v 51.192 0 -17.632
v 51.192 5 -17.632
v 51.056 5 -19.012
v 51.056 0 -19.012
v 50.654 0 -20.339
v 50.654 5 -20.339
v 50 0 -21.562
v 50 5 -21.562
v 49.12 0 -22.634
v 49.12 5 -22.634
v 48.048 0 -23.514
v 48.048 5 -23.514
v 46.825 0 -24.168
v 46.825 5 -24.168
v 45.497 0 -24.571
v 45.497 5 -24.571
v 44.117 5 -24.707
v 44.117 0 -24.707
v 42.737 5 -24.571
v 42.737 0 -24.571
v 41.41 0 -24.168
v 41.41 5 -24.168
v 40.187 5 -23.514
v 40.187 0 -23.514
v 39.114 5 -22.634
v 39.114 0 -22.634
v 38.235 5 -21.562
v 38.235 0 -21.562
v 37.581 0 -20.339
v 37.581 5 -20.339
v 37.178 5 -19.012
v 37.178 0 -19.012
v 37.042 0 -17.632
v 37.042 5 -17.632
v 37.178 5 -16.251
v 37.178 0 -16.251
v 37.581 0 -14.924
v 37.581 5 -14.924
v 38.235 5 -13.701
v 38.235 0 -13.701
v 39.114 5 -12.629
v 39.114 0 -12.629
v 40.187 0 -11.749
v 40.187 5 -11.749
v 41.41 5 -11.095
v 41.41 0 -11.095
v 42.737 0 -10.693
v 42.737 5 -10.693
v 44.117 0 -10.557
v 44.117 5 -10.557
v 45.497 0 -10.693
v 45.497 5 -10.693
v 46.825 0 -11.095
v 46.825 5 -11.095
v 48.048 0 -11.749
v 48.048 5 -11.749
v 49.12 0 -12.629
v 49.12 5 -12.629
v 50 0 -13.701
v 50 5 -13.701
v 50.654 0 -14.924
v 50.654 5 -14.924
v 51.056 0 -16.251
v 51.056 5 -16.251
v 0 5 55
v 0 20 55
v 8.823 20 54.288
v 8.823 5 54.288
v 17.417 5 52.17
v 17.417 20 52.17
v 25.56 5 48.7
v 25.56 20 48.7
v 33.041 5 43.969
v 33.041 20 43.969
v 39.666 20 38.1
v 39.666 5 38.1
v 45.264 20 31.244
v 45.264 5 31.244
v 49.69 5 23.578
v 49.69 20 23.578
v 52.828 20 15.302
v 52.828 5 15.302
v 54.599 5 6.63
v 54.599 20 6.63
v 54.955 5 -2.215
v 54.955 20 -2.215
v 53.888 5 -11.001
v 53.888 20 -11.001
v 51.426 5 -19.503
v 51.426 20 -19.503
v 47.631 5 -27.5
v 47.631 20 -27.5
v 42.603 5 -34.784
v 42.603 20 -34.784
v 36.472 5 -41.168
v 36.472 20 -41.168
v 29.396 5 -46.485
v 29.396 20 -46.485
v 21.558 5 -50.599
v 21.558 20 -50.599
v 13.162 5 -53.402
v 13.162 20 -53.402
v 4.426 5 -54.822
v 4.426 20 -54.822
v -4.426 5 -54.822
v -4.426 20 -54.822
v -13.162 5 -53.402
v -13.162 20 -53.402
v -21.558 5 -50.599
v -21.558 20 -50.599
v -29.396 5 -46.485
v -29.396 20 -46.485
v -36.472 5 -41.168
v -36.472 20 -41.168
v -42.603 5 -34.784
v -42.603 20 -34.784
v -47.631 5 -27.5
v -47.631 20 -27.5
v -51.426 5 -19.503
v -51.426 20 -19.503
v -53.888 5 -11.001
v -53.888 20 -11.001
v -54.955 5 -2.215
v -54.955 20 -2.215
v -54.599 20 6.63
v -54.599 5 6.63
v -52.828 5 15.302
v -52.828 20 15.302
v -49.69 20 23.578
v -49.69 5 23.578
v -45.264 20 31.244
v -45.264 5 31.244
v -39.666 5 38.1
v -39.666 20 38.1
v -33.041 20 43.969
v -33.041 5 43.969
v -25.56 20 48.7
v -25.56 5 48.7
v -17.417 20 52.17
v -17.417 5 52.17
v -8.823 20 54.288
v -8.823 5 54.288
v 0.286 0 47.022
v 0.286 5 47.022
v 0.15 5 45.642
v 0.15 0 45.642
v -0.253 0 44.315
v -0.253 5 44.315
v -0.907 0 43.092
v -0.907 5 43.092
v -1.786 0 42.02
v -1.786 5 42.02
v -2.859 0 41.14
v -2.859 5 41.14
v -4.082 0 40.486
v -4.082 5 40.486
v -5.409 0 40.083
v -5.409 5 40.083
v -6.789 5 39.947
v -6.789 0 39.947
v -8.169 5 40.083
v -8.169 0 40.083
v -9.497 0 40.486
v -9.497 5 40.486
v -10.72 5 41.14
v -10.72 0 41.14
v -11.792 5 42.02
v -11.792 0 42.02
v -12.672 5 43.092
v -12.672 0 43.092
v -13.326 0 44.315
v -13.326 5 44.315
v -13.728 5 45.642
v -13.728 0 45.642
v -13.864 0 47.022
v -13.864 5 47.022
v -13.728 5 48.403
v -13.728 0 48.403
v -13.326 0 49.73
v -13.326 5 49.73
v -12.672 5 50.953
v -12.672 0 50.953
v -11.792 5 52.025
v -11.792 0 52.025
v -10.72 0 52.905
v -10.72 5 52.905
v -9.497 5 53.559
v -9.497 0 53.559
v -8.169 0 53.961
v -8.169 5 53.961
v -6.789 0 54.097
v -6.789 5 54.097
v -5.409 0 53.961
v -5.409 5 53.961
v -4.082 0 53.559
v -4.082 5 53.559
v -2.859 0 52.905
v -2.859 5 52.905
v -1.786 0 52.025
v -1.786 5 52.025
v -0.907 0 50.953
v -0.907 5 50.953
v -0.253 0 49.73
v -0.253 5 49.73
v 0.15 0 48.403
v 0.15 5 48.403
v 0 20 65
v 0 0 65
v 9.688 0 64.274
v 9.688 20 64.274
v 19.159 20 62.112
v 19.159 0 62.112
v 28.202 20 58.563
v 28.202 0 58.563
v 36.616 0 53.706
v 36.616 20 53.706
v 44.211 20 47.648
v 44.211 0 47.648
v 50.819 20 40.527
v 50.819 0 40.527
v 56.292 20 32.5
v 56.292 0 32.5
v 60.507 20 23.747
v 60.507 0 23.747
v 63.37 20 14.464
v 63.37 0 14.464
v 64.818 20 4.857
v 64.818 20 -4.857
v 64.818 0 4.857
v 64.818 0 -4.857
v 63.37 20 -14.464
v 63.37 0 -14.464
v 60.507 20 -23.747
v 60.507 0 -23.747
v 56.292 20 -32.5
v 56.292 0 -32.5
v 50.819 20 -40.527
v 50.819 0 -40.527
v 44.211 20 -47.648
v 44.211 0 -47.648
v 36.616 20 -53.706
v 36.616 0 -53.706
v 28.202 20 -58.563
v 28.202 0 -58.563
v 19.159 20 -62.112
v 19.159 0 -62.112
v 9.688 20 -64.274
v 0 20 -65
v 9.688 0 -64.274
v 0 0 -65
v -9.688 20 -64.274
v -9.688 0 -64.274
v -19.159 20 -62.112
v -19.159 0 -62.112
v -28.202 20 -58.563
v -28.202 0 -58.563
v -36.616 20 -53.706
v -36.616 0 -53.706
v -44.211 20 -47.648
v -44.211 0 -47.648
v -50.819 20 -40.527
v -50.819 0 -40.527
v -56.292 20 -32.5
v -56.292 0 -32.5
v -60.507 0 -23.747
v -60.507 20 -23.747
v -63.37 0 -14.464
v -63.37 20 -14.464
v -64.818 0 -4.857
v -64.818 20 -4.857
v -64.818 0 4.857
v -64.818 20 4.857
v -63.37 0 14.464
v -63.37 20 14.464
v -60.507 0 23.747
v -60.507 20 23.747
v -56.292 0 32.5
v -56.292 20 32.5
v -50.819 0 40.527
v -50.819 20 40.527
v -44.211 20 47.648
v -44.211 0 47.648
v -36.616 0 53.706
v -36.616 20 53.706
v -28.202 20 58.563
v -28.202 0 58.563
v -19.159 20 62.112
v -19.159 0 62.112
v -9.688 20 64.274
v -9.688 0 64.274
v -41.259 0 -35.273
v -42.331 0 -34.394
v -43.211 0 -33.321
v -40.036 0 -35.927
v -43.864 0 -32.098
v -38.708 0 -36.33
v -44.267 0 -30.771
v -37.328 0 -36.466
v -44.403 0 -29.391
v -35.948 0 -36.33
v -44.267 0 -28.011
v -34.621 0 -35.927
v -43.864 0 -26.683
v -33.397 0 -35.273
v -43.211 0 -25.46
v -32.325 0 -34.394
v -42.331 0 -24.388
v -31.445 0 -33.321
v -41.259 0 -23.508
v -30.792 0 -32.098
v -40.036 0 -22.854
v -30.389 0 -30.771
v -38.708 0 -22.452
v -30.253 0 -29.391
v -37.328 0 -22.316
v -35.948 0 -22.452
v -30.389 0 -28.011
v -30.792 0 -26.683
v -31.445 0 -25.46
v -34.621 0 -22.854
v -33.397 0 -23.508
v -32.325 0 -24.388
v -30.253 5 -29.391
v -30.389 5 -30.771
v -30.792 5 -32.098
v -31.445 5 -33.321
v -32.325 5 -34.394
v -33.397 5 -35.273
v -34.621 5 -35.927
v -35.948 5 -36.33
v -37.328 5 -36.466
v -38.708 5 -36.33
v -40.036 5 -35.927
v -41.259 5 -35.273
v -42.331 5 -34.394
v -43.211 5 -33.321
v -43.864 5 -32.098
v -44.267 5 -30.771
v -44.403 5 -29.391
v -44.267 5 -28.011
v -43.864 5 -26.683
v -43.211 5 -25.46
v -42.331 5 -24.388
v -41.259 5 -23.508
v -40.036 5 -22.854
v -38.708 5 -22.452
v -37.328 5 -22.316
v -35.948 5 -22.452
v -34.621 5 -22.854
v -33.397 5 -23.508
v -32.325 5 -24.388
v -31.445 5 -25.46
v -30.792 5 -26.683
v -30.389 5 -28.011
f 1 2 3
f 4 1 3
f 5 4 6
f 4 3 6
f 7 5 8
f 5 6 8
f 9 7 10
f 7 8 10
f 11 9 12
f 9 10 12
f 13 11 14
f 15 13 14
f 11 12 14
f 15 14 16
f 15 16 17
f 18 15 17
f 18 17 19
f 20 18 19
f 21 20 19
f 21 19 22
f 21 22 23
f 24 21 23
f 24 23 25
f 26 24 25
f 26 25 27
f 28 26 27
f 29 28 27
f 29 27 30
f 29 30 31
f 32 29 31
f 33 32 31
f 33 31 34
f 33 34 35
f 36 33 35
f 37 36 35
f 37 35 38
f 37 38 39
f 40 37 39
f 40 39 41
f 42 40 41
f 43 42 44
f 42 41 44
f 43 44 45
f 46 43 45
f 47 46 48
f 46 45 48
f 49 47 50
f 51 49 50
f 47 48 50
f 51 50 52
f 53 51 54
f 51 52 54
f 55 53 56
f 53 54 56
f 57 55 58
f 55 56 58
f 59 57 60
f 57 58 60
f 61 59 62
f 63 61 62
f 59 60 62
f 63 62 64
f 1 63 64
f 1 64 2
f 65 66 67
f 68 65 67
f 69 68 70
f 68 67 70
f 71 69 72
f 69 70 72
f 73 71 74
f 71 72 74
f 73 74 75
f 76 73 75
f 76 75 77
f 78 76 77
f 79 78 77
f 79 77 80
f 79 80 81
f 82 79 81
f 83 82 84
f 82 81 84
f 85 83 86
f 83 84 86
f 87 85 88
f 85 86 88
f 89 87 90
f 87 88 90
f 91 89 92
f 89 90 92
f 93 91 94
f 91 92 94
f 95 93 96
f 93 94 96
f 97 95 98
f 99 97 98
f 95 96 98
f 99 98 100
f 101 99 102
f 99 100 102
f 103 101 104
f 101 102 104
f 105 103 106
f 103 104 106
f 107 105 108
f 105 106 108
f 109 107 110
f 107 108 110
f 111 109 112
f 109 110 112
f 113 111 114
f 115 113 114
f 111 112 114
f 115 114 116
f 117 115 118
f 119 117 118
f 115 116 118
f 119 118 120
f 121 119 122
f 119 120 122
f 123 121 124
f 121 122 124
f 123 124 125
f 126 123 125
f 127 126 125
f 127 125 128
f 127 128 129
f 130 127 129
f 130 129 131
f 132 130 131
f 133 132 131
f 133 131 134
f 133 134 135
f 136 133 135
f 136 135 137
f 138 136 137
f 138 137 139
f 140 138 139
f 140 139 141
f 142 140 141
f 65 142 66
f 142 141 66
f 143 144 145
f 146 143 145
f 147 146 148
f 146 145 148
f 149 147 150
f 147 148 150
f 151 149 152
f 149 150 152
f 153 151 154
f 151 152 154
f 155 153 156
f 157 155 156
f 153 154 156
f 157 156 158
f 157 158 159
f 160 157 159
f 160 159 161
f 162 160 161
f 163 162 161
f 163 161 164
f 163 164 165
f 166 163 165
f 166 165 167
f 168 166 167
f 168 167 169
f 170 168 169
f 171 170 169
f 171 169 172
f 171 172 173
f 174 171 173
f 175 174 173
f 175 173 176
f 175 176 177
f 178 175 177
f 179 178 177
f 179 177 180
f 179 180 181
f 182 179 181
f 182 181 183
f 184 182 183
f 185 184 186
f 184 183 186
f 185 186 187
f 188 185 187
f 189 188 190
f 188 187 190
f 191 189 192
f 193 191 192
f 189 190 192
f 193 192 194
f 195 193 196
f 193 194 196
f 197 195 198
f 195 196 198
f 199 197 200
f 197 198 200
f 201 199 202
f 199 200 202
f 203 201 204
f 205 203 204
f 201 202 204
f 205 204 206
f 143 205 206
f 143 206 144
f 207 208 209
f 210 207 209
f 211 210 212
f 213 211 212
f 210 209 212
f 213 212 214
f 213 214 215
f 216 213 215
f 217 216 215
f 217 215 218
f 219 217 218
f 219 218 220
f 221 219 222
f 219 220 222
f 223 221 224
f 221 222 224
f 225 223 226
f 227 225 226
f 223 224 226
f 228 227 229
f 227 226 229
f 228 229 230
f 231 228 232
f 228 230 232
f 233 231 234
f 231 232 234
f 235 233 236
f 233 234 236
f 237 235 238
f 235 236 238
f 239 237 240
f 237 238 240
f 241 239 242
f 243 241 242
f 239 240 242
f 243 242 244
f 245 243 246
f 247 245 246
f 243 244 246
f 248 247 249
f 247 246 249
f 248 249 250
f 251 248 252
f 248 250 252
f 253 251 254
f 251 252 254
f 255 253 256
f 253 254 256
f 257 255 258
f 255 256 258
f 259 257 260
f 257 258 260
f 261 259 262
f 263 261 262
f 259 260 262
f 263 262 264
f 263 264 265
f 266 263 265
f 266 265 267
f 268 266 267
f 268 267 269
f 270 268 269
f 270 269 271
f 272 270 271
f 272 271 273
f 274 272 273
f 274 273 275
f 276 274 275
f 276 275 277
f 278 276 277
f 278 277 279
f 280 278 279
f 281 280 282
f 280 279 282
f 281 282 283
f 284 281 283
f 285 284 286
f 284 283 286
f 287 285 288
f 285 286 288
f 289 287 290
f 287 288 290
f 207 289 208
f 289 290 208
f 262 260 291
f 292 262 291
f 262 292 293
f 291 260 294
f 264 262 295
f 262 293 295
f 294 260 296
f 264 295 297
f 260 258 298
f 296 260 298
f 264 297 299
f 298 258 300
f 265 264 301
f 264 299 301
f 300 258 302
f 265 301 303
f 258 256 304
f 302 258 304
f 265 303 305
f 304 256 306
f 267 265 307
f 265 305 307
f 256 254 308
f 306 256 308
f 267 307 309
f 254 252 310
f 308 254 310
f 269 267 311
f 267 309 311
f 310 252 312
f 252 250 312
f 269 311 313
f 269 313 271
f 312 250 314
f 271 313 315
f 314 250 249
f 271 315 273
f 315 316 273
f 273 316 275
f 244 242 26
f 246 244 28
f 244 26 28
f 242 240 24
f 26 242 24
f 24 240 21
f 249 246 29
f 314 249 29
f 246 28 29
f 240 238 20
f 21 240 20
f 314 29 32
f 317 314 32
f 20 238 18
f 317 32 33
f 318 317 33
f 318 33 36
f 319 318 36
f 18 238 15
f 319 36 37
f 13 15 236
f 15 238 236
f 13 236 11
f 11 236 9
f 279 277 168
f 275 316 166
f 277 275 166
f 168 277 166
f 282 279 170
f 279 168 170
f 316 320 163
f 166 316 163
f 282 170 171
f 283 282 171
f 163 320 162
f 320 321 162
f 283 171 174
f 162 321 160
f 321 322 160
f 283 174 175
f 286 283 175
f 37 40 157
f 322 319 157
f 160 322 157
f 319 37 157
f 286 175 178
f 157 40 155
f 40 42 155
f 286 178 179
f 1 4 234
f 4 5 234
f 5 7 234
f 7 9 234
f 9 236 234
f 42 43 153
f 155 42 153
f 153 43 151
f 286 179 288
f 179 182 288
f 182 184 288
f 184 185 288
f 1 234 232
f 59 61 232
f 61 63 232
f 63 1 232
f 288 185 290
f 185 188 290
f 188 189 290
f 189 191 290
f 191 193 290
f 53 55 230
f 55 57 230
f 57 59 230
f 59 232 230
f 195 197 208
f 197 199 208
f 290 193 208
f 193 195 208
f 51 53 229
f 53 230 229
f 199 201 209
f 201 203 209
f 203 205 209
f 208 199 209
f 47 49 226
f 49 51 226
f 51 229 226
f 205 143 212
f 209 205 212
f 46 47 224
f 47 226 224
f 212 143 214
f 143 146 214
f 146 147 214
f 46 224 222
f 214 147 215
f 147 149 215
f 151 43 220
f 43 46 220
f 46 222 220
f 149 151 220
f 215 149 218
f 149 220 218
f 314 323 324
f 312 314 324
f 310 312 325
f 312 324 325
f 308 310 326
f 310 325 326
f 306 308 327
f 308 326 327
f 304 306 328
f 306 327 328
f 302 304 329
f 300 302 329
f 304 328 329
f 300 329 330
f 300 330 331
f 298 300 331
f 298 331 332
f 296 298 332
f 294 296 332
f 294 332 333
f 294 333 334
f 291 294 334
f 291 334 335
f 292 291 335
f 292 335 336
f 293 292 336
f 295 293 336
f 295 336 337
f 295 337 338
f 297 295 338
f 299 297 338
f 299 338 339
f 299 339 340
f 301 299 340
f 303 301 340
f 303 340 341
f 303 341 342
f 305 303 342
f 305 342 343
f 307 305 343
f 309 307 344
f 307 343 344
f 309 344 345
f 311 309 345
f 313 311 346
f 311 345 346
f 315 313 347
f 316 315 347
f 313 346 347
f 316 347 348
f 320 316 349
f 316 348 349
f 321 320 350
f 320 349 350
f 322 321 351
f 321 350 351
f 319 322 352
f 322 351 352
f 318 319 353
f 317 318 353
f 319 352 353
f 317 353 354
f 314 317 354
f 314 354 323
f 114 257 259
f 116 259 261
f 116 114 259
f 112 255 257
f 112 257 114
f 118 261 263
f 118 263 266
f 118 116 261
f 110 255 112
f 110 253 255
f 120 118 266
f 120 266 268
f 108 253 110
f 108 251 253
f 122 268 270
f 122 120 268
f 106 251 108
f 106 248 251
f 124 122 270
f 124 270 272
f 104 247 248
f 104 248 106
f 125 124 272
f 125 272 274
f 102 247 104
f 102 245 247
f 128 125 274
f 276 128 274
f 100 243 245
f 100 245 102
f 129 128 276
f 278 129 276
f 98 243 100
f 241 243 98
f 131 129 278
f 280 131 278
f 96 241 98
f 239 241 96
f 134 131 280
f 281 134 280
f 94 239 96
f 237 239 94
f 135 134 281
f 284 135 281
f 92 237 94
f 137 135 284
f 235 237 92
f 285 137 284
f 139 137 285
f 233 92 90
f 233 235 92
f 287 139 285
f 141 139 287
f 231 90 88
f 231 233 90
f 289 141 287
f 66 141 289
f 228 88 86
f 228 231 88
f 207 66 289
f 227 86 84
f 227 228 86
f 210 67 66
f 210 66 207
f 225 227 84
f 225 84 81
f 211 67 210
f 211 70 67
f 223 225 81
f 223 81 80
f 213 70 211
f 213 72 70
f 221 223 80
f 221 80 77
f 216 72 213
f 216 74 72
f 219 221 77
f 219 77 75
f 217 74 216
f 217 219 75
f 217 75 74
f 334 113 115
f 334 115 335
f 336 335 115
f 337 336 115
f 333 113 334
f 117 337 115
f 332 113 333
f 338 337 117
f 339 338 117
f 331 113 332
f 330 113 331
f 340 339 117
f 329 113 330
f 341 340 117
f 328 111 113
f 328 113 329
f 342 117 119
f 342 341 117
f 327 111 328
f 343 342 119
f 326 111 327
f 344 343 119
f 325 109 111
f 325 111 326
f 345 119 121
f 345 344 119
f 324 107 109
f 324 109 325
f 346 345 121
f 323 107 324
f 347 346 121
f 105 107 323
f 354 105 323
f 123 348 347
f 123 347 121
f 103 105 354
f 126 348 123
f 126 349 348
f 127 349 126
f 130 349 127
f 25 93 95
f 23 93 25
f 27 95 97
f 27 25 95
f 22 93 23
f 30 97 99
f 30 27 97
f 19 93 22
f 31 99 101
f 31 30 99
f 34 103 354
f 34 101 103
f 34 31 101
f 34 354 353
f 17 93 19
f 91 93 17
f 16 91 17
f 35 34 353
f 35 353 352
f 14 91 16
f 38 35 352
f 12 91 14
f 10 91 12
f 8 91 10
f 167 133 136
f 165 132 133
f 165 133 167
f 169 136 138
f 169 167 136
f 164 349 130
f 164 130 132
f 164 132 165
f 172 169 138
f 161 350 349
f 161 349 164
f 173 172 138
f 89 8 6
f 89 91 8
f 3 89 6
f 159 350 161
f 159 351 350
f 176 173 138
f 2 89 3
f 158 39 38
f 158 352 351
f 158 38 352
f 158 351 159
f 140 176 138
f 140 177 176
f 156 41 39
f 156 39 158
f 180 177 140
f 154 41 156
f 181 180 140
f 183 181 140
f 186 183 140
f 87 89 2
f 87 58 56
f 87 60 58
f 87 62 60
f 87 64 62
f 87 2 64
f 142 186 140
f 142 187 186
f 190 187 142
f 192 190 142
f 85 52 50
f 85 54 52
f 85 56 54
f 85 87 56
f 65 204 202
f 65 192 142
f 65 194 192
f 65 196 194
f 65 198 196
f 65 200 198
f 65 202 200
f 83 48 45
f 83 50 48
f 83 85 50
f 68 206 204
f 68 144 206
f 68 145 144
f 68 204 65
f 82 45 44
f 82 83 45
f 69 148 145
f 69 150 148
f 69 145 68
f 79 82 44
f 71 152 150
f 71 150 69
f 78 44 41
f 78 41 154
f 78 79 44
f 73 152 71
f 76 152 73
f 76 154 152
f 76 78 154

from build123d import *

# Parameters (mm, degrees)
SKETCH1_R                 = 65
BOSS_EXTRUDE1_DEPTH       = 20
SKETCH2_R                 = 55
CUT_EXTRUDE1_DEPTH        = 15
F_1_0MM_DOWEL_HOLE1_D     = 14.15
F_1_0MM_DOWEL_HOLE1_DEPTH = 8.14891112
F_1_0MM_DOWEL_HOLE1_TIP   = 4.25108888


with BuildPart() as part:
    # Sketch1 → Boss-Extrude1 (new body)
    with BuildSketch(Plane(origin=(0, 0, 0), x_dir=(1, 0, 0), z_dir=(0, 1, 0))):
        with Locations(Location((0, 0, 0), (0, 0, 270))):
            Circle(SKETCH1_R)
    extrude(amount=BOSS_EXTRUDE1_DEPTH)

    # Sketch2 → Cut-Extrude1 (cut)
    with BuildSketch(Plane(origin=(0, 20, 0), x_dir=(1, 0, 0), z_dir=(0, 1, 0))):
        with Locations(Location((0, 0, 0), (0, 0, 270))):
            Circle(SKETCH2_R)
    extrude(amount=-CUT_EXTRUDE1_DEPTH, mode=Mode.SUBTRACT)

    # Ø1.0mm Dowel Hole1
    with Locations(Plane(origin=(0, 0, 0), x_dir=(-1, 0, 0), z_dir=(0, -1, 0))):
        with Locations((37.328017274, 29.390801732), (6.7891723, -47.022412098), (-44.117189574, 17.631610366)):
            Hole(F_1_0MM_DOWEL_HOLE1_D / 2, depth=F_1_0MM_DOWEL_HOLE1_DEPTH)
            with Locations((0, 0, -(F_1_0MM_DOWEL_HOLE1_DEPTH + F_1_0MM_DOWEL_HOLE1_TIP / 2))):  # 118° drill point
                Cone(0, F_1_0MM_DOWEL_HOLE1_D / 2, F_1_0MM_DOWEL_HOLE1_TIP, mode=Mode.SUBTRACT)


solid = part.part
